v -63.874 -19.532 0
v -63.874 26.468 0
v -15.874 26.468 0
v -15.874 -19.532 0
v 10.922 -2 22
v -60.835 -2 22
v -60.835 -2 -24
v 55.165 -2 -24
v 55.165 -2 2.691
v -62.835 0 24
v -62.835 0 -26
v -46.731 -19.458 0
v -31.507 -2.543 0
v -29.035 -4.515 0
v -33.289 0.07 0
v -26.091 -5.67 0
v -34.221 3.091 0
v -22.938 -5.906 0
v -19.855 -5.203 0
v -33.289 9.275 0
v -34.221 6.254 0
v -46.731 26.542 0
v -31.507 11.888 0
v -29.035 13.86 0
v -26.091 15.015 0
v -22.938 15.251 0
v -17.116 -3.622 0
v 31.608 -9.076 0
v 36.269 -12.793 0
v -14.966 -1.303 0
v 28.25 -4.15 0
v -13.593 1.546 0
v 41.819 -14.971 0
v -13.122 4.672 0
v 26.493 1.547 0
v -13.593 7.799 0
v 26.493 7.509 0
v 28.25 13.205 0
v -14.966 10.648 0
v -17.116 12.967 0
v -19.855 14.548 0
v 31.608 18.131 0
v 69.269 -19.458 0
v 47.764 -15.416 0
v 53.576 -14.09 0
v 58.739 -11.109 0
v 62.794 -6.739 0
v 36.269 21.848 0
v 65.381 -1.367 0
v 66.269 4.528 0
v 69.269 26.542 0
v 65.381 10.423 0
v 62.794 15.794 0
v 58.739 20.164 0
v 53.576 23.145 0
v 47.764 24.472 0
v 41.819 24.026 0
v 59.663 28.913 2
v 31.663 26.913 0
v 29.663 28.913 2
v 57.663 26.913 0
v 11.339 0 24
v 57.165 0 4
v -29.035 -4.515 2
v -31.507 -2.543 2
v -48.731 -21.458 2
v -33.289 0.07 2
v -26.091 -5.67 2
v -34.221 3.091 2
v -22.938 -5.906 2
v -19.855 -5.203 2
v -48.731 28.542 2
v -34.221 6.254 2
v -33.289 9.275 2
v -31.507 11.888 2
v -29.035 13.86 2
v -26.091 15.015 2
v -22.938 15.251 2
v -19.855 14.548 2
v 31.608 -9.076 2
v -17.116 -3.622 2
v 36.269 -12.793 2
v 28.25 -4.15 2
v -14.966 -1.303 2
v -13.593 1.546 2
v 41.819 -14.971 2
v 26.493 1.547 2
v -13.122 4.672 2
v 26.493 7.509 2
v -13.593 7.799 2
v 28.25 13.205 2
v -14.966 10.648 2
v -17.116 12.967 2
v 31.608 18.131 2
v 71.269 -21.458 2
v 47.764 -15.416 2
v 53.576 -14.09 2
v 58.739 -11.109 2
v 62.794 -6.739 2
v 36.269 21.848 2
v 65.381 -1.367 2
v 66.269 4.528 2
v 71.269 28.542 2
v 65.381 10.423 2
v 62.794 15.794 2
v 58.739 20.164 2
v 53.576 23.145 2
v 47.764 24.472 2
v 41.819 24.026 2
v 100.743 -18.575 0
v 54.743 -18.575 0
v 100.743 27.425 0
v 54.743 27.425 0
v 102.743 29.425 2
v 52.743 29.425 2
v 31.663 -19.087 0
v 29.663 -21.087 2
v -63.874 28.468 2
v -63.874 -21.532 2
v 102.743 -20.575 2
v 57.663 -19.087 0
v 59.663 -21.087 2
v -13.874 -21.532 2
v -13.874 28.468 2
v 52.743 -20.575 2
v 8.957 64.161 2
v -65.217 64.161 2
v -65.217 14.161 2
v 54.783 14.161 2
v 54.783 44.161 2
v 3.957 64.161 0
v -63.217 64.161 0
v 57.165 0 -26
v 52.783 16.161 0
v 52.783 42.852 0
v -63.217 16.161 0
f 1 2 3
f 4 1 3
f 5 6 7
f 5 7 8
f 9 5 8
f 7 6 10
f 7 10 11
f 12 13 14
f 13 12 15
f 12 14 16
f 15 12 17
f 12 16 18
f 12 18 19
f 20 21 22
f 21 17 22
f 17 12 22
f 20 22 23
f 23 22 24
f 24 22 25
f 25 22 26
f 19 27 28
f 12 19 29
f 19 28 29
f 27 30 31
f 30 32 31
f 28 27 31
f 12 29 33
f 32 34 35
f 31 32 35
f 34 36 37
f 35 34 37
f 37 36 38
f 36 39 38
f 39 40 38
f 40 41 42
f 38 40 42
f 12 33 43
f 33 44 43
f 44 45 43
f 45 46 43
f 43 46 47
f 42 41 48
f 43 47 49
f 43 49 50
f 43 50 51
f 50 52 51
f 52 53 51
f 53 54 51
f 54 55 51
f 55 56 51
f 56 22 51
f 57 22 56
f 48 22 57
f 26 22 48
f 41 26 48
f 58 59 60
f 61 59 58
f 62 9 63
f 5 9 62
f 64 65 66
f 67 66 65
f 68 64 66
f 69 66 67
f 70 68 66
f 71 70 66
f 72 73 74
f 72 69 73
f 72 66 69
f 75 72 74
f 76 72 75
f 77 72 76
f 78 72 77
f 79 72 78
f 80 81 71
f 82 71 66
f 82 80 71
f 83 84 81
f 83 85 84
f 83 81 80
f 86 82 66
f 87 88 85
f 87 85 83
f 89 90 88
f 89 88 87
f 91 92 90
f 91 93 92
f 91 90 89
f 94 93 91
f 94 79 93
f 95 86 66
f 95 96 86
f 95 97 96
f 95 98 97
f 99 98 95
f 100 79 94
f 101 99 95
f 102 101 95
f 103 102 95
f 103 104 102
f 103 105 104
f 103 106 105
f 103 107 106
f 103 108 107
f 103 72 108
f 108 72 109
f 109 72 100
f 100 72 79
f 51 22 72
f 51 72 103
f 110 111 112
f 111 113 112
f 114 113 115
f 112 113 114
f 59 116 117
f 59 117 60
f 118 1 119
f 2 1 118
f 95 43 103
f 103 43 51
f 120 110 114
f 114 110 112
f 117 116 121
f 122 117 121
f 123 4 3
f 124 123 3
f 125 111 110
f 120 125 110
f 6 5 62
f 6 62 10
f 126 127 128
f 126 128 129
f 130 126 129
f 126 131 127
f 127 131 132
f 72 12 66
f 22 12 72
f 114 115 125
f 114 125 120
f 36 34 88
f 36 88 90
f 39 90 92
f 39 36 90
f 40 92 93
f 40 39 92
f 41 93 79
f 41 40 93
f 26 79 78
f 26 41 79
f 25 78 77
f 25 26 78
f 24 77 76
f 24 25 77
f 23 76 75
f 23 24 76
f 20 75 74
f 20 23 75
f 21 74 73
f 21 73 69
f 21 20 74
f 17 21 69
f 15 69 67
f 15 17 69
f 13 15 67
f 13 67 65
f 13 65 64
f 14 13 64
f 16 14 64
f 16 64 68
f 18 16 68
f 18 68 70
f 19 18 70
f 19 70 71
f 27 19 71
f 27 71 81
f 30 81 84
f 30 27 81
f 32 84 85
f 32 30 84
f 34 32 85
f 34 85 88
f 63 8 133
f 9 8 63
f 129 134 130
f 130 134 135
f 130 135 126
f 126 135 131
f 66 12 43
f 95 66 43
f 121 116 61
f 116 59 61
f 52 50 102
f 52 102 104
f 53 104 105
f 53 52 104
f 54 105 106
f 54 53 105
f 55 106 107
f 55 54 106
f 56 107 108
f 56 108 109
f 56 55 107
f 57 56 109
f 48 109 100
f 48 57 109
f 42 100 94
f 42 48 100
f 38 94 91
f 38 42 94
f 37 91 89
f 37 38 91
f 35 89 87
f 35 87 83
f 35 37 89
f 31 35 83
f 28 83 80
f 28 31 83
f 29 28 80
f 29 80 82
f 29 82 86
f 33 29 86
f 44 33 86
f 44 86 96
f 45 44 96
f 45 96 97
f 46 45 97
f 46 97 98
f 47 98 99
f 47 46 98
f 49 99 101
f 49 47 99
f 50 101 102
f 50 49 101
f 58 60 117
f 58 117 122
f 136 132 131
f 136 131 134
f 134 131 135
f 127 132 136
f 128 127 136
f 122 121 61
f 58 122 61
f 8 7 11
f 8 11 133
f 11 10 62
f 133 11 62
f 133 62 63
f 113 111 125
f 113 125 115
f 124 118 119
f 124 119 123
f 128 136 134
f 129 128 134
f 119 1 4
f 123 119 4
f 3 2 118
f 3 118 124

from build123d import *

# Parameters (mm, degrees)
F0_W      = 120
F0_H      = 50
F0_R      = 10.6084843686
F0_R_2    = 20
F1_DEPTH  = 2
F2_W      = 50
F2_H      = 50
F3_DEPTH  = 2
F4_W      = 30
F4_H      = 50
F5_DEPTH  = 2
F6_W      = 50
F6_H      = 50
F7_DEPTH  = 2
F9_DEPTH  = 2
F11_DEPTH = 2
F12_SIZE  = 1.99999
F13_SIZE  = 1.99999
F14_SIZE  = 1.99999
F15_SIZE  = 1.99999
F16_SIZE  = 1.99999
F17_SIZE  = 1.99999


# Not quite as in the source:
# - a fillet or chamfer is up to 0.001 mm smaller than in the source, because OpenCascade refuses the exact size


with BuildPart() as f1:
    # F0 (on Top) → F1 (new body)
    with BuildSketch(Plane.XY):
        with Locations((11.2693273971, 3.541611135)):
            Rectangle(F0_W, F0_H)
        with Locations((-23.7306726029, 4.672499537)):
            Circle(F0_R, mode=Mode.SUBTRACT)
        with Locations((46.2693273971, 4.5276646413)):
            Circle(F0_R_2, mode=Mode.SUBTRACT)
    extrude(amount=F1_DEPTH)

    # F12 (size 2 in the source; OpenCascade refuses exactly that, so slightly less here)
    f12_edges = [f1.edges().sort_by_distance(p)[0] for p in [
        (71.269327, 3.541611, 0),
        (11.269327, 28.541611, 0),
        (-48.730673, 3.541611, 0),
        (11.269327, -21.458389, 0),
    ]]
    chamfer(f12_edges, length=F12_SIZE)


with BuildPart() as f3:
    # F2 (on Top) → F3 (new body)
    with BuildSketch(Plane.XY):
        with Locations((-38.8736227571, 3.468115814)):
            Rectangle(F2_W, F2_H)
    extrude(amount=F3_DEPTH)

    # F13 (size 2 in the source; OpenCascade refuses exactly that, so slightly less here)
    f13_edges = [f3.edges().sort_by_distance(p)[0] for p in [
        (-38.873623, -21.531884, 0),
        (-13.873623, 3.468116, 0),
        (-38.873623, 28.468116, 0),
    ]]
    chamfer(f13_edges, length=F13_SIZE)


with BuildPart() as f5:
    # F4 (on Top) → F5 (new body)
    with BuildSketch(Plane.XY):
        with Locations((44.6629953704, 3.9126975462)):
            Rectangle(F4_W, F4_H)
    extrude(amount=F5_DEPTH)

    # F14 (size 2 in the source; OpenCascade refuses exactly that, so slightly less here)
    f14_edges = [f5.edges().sort_by_distance(p)[0] for p in [
        (44.662995, -21.087302, 0),
        (29.662995, 3.912698, 0),
        (44.662995, 28.912698, 0),
        (59.662995, 3.912698, 0),
    ]]
    chamfer(f14_edges, length=F14_SIZE)


with BuildPart() as f7:
    # F6 (on Top) → F7 (new body)
    with BuildSketch(Plane.XY):
        with Locations((77.7432139613, 4.4250842184)):
            Rectangle(F6_W, F6_H)
    extrude(amount=F7_DEPTH)

    # F15 (size 2 in the source; OpenCascade refuses exactly that, so slightly less here)
    f15_edges = [f7.edges().sort_by_distance(p)[0] for p in [
        (77.743214, -20.574916, 0),
        (52.743214, 4.425084, 0),
        (77.743214, 29.425084, 0),
        (102.743214, 4.425084, 0),
    ]]
    chamfer(f15_edges, length=F15_SIZE)


with BuildPart() as f9:
    # F8 (on Top) → F9 (new body)
    with BuildSketch(Plane.XY):
        Polygon((-65.216818493, 64.1614470469), (-65.216818493, 14.1614470469), (54.783181507, 14.1614470469), (54.783181507, 44.1614470469), (8.9574245575, 64.1614470469), align=None)
    extrude(amount=F9_DEPTH)

    # F16 (size 2 in the source; OpenCascade refuses exactly that, so slightly less here)
    f16_edges = [f9.edges().sort_by_distance(p)[0] for p in [
        (-5.216818, 14.161447, 0),
        (-65.216818, 39.161447, 0),
        (54.783182, 29.161447, 0),
        (31.870303, 54.161447, 0),
    ]]
    chamfer(f16_edges, length=F16_SIZE)


with BuildPart() as f11:
    # F10 (on Front) → F11 (new body)
    with BuildSketch(Plane.XZ):
        Polygon((-62.8348486101, 24), (-62.8348486101, -26), (57.1651513899, -26), (57.1651513899, 4), (11.3393944404, 24), align=None)
    extrude(amount=F11_DEPTH)

    # F17 (size 2 in the source; OpenCascade refuses exactly that, so slightly less here)
    f17_edges = [f11.edges().sort_by_distance(p)[0] for p in [
        (34.252273, -2, 14),
        (-25.747727, -2, 24),
        (-62.834849, -2, -1),
        (57.165151, -2, -11),
        (-2.834849, -2, -26),
    ]]
    chamfer(f17_edges, length=F17_SIZE)


solid = Compound([f1.part, f3.part, f5.part, f7.part, f9.part, f11.part])
